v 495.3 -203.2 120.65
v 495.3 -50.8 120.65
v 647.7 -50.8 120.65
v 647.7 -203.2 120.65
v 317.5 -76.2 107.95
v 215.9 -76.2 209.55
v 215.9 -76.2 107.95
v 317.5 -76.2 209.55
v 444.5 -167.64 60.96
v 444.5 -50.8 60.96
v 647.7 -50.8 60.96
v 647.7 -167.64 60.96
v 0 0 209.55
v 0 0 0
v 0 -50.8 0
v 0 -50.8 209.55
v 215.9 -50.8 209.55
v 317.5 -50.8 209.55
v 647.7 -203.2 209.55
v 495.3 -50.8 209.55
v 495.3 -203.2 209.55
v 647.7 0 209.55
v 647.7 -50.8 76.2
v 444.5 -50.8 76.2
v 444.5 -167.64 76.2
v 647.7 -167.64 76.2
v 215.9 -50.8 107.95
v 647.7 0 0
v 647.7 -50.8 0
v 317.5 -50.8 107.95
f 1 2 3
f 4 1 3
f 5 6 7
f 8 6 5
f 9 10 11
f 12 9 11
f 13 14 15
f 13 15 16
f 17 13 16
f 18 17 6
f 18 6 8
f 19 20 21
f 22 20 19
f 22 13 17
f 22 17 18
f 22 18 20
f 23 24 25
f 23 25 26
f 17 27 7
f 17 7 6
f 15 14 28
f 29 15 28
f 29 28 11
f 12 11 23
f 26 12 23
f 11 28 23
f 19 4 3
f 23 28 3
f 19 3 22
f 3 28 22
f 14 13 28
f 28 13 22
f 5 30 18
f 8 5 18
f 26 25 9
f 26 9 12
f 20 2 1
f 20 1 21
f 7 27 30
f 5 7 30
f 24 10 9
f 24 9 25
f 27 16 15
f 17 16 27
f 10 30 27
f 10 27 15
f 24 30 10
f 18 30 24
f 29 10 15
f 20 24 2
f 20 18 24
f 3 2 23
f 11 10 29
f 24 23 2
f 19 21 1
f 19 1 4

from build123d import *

# Parameters (mm, degrees)
F0_W     = 647.7
F0_H     = 209.55
F1_DEPTH = 50.8
F2_W     = 101.6
F2_H     = 101.6
F3_DEPTH = 25.4
F4_W     = 203.2
F4_H     = 15.24
F5_DEPTH = 116.84
F6_W     = 152.4
F6_H     = 88.9
F7_DEPTH = 152.4


with BuildPart() as f1:
    # F0 (on Front) → F1 (new body)
    with BuildSketch(Plane.XZ):
        with Locations((323.85, 104.775)):
            Rectangle(F0_W, F0_H)
    extrude(amount=F1_DEPTH)

    # F2 (on face) → F3 (join)
    with BuildSketch(Plane.XZ.offset(50.8)):
        with Locations((266.7, 158.75)):
            Rectangle(F2_W, F2_H)
    extrude(amount=F3_DEPTH)

    # F4 (on face) → F5 (join)
    with BuildSketch(Plane.XZ.offset(50.8)):
        with Locations((546.1, 68.58)):
            Rectangle(F4_W, F4_H)
    extrude(amount=F5_DEPTH)

    # F6 (on face) → F7 (join)
    with BuildSketch(Plane.XZ.offset(50.8)):
        with Locations((571.5, 165.1)):
            Rectangle(F6_W, F6_H)
    extrude(amount=F7_DEPTH)


solid = f1.part
